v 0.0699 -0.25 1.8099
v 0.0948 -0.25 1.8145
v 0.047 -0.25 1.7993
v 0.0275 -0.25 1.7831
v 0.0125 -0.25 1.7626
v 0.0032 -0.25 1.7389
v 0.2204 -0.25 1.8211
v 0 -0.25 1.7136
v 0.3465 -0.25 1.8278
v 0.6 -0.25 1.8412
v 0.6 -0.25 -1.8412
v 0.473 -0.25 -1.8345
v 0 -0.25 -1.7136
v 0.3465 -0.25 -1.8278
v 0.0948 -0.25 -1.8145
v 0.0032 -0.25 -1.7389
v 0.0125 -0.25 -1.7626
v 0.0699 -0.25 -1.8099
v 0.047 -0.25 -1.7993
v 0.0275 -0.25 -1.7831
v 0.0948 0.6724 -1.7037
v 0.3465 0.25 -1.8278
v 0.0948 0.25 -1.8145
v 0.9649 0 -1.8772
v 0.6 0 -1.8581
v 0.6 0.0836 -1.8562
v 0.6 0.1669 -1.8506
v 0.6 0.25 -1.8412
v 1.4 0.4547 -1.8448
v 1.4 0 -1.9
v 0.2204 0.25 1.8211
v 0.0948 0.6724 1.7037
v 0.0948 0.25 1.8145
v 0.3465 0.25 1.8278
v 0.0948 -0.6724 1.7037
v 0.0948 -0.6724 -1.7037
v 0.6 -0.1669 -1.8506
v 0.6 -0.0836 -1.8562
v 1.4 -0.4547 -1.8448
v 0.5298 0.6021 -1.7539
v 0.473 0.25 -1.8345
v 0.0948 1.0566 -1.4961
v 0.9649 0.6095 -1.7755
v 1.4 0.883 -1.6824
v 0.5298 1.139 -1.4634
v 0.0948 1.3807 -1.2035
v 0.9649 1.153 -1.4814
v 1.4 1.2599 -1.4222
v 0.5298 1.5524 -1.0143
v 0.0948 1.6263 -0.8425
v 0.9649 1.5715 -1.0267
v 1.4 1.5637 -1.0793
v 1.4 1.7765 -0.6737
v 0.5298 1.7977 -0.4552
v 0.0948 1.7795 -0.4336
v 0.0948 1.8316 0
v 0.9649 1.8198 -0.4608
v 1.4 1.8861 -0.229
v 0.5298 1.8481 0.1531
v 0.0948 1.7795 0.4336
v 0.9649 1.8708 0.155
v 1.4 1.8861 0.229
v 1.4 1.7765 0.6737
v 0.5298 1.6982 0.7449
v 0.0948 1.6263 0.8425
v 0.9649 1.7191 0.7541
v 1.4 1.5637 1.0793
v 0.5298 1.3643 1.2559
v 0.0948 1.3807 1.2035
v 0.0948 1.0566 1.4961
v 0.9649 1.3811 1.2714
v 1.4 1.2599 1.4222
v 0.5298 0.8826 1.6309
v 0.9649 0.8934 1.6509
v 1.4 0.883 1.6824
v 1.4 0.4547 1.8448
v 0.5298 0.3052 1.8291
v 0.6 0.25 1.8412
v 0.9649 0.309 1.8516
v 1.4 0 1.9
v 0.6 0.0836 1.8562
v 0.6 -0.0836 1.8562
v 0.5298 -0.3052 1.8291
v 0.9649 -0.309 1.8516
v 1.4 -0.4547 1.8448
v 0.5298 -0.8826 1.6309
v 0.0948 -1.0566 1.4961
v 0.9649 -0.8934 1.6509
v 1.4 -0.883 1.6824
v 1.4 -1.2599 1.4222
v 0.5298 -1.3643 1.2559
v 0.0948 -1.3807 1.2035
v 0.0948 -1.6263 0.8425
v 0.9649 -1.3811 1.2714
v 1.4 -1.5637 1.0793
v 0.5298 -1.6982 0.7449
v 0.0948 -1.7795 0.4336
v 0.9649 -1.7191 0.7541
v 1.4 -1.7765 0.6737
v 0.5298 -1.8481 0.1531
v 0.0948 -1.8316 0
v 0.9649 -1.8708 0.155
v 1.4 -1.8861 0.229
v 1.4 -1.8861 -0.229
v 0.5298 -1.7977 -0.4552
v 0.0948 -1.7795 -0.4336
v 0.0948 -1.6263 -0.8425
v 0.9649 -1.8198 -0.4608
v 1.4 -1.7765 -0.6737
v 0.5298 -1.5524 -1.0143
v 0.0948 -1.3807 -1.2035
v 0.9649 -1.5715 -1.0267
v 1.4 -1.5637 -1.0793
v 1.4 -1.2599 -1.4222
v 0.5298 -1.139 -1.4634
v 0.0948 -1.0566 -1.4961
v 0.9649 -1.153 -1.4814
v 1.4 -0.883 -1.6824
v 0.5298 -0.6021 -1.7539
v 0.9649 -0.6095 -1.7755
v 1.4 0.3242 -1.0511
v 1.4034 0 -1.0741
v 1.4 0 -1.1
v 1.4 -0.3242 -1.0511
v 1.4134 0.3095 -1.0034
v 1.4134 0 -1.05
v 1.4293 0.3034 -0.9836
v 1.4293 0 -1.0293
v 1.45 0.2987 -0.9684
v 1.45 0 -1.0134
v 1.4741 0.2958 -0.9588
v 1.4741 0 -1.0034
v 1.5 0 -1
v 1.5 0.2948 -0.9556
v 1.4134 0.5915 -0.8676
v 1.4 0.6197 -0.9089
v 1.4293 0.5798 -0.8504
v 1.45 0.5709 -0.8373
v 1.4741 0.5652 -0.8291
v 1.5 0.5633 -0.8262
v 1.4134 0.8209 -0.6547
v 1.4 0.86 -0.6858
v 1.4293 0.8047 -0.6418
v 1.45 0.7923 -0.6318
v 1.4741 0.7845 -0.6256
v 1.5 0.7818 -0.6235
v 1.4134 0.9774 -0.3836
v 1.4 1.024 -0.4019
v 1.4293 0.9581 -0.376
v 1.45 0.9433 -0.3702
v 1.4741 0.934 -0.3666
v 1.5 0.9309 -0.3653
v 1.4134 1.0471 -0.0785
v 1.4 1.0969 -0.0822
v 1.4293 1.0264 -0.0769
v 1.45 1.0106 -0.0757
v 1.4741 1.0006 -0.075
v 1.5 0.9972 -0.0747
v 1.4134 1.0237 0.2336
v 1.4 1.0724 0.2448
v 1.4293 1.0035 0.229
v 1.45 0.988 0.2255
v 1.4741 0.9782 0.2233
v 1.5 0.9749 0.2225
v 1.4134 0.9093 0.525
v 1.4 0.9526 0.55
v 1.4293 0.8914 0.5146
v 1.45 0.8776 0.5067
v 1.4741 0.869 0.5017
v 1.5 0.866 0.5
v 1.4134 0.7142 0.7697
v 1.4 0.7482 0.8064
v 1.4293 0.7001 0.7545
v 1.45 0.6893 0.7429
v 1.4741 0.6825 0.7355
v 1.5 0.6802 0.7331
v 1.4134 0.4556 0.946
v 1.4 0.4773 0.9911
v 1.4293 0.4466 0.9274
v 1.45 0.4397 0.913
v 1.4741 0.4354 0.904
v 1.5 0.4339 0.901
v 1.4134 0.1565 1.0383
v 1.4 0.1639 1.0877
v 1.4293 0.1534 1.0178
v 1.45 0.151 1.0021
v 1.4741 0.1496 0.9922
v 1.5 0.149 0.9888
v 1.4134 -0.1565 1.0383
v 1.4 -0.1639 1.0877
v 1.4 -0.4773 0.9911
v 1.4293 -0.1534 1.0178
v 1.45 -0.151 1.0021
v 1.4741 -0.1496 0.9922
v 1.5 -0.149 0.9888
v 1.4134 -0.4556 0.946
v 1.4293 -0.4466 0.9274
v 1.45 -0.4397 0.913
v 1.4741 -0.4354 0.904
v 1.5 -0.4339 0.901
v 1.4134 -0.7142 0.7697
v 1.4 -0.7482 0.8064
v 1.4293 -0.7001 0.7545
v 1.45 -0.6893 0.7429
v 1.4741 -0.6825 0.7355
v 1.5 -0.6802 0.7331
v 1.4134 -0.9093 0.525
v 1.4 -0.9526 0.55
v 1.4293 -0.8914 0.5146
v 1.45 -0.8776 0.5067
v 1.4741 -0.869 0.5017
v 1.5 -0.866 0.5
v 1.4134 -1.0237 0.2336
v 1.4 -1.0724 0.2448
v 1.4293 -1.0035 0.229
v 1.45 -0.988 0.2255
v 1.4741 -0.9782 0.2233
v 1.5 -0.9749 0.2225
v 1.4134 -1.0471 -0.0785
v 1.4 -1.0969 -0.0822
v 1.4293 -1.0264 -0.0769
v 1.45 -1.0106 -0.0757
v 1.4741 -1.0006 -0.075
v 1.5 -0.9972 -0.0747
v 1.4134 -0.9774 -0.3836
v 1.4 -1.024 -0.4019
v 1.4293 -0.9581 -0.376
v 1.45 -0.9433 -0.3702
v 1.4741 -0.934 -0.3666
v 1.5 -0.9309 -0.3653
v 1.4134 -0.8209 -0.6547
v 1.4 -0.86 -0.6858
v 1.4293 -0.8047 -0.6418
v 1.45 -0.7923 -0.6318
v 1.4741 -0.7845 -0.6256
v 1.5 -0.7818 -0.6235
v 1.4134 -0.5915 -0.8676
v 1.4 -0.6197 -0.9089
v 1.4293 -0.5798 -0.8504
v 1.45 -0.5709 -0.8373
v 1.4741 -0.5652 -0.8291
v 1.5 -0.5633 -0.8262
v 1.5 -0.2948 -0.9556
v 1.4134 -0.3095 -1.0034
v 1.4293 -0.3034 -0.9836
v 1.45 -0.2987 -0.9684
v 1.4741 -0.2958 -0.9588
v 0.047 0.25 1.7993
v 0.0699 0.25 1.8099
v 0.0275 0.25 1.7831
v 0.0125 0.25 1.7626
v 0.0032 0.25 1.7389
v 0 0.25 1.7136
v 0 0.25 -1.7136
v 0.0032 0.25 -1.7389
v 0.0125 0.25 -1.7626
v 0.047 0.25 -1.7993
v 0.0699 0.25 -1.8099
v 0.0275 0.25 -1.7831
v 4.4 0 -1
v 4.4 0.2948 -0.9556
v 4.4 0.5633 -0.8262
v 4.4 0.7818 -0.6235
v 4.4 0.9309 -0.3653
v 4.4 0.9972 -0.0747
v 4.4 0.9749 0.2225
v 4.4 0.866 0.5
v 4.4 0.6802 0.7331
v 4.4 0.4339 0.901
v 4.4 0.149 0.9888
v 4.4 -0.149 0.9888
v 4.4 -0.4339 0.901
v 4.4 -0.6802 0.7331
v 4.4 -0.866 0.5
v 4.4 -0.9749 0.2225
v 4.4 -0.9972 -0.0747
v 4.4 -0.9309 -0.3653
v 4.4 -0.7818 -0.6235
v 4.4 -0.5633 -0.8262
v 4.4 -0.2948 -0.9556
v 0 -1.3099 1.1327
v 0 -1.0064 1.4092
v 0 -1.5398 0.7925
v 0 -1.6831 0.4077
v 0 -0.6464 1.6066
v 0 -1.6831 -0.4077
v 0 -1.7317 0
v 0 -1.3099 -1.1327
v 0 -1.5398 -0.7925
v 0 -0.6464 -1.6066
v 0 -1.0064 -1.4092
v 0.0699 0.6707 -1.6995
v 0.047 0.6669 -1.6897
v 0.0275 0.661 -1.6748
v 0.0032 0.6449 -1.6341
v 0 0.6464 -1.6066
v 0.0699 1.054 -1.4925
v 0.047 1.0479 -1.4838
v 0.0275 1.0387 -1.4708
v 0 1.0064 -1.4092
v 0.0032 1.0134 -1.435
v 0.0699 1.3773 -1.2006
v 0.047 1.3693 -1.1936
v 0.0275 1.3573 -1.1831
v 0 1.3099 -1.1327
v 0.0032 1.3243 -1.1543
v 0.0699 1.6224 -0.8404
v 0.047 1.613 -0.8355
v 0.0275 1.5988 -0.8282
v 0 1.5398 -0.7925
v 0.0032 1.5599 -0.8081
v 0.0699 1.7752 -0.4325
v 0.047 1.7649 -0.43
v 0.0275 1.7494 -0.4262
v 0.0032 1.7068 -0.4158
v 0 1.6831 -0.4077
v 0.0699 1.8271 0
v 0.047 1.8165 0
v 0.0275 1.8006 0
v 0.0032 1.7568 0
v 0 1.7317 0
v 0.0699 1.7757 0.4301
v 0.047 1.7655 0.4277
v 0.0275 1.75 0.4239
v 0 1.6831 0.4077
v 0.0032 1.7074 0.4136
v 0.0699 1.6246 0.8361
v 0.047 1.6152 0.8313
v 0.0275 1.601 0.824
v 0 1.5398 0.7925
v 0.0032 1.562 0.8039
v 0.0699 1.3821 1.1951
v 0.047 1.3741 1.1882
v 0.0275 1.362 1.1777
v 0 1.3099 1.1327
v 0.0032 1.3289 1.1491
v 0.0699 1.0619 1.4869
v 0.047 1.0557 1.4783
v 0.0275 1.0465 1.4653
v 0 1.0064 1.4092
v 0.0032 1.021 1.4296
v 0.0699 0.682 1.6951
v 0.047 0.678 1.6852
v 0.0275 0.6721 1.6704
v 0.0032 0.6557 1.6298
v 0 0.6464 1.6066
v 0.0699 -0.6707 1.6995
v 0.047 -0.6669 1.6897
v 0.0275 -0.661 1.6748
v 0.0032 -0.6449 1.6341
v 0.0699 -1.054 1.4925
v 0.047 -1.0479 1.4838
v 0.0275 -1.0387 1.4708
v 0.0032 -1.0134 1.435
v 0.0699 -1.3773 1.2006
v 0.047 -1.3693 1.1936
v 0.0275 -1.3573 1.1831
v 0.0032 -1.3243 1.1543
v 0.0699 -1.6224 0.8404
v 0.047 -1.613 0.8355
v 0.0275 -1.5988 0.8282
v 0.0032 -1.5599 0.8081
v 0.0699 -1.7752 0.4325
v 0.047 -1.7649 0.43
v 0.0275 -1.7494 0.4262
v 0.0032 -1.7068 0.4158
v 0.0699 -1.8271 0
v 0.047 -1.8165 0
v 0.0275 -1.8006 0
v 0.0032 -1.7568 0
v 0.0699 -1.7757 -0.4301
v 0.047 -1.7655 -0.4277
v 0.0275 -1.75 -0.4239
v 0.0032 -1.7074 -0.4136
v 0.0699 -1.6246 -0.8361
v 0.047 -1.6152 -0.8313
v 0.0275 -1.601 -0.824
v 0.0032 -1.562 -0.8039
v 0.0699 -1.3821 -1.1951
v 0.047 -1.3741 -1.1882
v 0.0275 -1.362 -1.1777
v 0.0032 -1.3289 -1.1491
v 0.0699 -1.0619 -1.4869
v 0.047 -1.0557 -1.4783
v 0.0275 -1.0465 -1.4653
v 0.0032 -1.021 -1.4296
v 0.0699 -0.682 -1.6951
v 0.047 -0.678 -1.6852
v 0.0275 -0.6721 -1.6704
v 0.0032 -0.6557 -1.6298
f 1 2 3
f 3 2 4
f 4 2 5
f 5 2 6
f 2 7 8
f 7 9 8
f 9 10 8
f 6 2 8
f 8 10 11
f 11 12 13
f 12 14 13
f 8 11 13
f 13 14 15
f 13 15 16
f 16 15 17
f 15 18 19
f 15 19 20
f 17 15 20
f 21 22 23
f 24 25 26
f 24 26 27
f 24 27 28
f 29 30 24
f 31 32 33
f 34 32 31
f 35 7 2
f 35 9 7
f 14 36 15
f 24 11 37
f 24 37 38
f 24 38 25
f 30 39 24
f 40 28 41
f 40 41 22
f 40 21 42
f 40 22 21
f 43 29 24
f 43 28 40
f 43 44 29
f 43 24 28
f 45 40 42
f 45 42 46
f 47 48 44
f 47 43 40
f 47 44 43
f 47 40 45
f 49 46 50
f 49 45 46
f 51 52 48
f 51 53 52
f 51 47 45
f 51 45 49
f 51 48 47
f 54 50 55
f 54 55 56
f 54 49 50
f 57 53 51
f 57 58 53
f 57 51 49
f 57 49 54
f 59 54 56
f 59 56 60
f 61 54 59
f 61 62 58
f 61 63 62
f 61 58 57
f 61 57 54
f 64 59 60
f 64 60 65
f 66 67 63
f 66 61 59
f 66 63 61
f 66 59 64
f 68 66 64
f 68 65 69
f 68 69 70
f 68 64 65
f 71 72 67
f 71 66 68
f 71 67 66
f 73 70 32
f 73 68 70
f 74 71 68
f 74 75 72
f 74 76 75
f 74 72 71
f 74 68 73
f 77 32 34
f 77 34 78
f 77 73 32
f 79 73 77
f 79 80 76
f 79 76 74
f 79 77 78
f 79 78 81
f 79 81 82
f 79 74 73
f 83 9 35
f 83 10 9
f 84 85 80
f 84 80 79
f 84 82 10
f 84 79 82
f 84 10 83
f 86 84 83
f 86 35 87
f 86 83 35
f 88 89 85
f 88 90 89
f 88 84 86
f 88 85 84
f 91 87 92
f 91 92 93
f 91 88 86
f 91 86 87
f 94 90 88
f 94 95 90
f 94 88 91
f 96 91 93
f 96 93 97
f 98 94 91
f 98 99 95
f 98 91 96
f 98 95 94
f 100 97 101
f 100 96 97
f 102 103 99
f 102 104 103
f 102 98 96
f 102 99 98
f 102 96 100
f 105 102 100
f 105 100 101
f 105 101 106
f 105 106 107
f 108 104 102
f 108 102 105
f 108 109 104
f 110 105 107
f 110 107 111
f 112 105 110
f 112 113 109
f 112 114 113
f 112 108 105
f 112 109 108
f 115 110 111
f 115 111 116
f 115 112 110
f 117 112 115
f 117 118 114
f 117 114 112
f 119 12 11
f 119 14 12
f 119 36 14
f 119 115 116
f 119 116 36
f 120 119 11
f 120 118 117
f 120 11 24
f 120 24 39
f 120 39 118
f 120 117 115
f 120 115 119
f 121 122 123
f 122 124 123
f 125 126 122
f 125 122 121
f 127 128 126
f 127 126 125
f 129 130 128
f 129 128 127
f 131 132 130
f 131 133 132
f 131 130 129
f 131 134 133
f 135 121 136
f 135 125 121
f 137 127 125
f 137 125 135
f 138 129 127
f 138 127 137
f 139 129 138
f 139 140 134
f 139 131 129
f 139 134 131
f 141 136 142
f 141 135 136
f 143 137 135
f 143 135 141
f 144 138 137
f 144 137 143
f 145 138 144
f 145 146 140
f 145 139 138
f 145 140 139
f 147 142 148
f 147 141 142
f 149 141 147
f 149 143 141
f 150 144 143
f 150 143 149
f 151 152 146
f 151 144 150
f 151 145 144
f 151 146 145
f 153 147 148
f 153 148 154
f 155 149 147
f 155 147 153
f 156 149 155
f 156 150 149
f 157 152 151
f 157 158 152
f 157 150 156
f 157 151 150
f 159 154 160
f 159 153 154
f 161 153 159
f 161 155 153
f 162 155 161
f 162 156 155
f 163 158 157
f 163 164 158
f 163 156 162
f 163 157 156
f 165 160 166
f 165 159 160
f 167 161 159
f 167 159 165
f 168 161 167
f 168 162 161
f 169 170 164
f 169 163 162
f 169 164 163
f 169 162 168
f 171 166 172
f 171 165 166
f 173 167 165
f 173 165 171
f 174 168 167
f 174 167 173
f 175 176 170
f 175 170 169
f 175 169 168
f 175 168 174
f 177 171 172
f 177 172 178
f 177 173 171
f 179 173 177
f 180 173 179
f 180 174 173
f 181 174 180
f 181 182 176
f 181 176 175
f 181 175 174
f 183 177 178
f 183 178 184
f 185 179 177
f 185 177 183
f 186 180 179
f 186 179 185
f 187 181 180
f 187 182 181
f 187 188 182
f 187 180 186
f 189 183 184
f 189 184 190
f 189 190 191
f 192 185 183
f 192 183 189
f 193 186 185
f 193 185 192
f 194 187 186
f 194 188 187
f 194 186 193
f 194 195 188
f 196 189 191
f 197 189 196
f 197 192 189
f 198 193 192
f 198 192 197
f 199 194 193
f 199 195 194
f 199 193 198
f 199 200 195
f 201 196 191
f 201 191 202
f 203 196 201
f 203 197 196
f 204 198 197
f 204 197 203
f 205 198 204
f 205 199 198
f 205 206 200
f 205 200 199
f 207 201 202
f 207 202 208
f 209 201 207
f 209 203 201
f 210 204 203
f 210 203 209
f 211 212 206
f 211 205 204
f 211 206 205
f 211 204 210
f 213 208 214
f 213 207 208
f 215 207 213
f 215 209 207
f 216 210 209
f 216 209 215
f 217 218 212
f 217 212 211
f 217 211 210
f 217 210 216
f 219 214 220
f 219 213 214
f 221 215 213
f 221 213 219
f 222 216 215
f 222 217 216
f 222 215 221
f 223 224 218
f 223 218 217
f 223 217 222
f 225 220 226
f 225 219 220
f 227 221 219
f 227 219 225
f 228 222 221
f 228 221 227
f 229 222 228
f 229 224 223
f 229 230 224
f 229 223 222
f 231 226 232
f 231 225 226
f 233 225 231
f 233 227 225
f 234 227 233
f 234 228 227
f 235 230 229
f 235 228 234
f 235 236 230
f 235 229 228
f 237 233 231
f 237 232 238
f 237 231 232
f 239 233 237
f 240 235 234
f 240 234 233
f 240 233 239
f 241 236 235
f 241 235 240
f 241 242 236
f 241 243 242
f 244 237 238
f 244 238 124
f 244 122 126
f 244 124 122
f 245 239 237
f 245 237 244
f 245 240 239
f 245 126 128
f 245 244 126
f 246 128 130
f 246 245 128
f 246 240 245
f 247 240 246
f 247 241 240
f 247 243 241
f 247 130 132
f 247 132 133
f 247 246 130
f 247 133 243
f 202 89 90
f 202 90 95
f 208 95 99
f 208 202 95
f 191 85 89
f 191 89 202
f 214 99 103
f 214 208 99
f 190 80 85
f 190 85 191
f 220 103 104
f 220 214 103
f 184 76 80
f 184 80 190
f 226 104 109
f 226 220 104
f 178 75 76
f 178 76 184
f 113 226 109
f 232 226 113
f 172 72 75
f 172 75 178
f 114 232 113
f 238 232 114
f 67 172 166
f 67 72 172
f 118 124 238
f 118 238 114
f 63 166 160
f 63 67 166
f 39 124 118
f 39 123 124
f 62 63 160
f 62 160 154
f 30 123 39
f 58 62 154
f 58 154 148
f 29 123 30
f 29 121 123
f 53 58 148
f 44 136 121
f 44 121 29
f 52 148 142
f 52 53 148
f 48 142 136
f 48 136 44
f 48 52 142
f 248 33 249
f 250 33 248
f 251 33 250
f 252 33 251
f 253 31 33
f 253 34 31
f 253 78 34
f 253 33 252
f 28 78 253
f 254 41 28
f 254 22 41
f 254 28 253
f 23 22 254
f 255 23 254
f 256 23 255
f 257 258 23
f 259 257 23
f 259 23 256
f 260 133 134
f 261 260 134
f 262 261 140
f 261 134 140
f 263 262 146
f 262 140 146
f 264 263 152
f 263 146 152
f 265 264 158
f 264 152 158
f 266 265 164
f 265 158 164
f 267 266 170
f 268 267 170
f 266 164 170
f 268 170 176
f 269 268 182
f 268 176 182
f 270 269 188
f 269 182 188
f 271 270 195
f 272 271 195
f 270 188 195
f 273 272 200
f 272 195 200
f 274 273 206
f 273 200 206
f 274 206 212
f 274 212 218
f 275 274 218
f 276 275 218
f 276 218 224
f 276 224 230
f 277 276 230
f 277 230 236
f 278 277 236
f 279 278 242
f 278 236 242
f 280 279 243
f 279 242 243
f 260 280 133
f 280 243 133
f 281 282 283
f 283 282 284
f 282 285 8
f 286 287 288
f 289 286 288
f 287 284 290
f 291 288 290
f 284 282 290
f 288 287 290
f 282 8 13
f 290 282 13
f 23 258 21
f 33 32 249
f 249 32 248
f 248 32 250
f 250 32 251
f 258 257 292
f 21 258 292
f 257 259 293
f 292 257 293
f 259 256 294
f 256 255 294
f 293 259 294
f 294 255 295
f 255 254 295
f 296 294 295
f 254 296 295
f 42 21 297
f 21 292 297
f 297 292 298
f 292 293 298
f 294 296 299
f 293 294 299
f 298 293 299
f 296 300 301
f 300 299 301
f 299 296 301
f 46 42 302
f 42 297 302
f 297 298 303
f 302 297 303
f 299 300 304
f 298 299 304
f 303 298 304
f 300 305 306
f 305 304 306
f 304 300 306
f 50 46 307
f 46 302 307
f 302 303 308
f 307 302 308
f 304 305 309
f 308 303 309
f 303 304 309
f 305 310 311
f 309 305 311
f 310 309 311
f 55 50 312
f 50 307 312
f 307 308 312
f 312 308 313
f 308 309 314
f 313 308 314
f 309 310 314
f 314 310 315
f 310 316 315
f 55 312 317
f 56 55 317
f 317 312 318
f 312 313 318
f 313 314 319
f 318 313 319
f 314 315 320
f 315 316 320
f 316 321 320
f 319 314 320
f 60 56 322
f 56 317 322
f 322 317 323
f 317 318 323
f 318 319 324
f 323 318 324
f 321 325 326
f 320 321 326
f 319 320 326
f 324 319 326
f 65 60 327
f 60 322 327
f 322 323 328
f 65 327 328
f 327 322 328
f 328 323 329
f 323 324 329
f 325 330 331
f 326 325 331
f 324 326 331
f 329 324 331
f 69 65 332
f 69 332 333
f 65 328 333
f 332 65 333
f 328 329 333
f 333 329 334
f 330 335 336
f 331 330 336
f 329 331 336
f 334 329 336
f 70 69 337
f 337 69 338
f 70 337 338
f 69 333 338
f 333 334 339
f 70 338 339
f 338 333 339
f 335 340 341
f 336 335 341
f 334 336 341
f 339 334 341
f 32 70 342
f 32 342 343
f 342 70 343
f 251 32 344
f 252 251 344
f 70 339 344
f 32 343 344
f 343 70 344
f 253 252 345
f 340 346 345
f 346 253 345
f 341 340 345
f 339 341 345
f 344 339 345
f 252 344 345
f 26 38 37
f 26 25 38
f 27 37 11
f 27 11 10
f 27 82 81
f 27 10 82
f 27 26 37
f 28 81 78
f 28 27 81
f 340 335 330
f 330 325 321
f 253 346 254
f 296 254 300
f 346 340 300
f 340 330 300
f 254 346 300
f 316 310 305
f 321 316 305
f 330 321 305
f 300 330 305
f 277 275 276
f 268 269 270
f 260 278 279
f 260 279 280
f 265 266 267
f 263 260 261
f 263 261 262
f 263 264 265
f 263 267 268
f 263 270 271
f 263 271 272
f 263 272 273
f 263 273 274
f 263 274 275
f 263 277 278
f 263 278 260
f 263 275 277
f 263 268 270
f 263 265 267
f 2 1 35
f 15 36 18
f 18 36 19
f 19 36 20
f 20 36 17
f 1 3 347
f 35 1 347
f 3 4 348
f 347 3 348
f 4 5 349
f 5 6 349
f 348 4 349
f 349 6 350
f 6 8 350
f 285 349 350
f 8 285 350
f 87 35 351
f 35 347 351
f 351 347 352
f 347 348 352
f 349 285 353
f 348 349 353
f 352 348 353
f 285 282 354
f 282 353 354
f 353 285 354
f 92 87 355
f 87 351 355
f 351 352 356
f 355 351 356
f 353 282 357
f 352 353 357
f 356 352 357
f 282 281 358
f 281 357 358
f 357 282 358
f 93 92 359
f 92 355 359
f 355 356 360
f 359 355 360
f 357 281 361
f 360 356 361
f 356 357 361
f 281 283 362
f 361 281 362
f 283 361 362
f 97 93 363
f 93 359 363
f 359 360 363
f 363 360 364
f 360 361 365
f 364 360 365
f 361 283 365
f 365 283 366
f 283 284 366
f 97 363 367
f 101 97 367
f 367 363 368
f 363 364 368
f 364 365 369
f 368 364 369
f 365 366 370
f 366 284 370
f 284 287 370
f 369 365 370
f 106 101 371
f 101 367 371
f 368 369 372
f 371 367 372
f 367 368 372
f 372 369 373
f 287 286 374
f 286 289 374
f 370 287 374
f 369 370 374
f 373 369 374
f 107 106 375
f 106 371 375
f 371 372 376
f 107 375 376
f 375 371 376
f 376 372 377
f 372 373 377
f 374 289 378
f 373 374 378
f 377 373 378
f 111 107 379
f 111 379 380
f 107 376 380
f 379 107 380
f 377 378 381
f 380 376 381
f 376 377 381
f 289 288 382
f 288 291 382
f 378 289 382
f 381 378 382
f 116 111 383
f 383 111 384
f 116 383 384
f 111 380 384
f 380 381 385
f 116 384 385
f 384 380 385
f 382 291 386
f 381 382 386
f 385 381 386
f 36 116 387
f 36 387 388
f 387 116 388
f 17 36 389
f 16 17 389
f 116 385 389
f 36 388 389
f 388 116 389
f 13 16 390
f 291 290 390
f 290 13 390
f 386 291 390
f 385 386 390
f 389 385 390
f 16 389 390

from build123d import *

# Parameters (mm, degrees)
SKETCH2_R       = 1.9
BASEHEAD_DEPTH  = 1.4
BASEHEAD_DRAFT  = -3
SKETCH3_R       = 1
BASEBODY_DEPTH  = 3
SLOT_DEPTH      = 8.598684097
SLOT_DEPTH_BACK = 8.598684097
SKETCH4_W       = 0.5
SKETCH4_H       = 0.6
HEADFILLET_R    = 0.1


with BuildPart() as part:
    # Sketch2 → BaseHead (with draft: the straight prism first)
    with BuildSketch(Plane(origin=(1.4, 0, 0), x_dir=(0, 0, -1), z_dir=(1, 0, 0))):
        Circle(SKETCH2_R)
    extrude(amount=-BASEHEAD_DEPTH)
    # BaseHead: the draft: its side faces are tilted about the plane it starts from
    basehead_sides = [part.faces().sort_by_distance(p)[0] for p in [
        (0.7, 0, 1.9),
    ]]
    draft(basehead_sides, Plane(origin=(1.4, 0, 0), x_dir=(0, 0, -1), z_dir=(1, 0, 0)), BASEHEAD_DRAFT)

    # Sketch3 → BaseBody (add)
    with BuildSketch(Plane(origin=(1.4, -1.110095321, -1.354392991), x_dir=(0, 0, -1), z_dir=(1, 0, 0))):
        with Locations((-1.354392991, 1.110095321)):
            Circle(SKETCH3_R)
    extrude(amount=BASEBODY_DEPTH)

    # Sketch4 → Slot (cut, two sides: drawn at the far end of the back side and taken through both)
    with BuildSketch(Plane(origin=(-1.9, -1.9, 0), x_dir=(0, 1, 0), z_dir=(0, 0, 1)).offset(-SLOT_DEPTH_BACK)):
        with Locations((1.9, -2.2)):
            Rectangle(SKETCH4_W, SKETCH4_H)
    extrude(amount=SLOT_DEPTH + SLOT_DEPTH_BACK, mode=Mode.SUBTRACT)

    # HeadFillet
    headfillet_edges = [part.edges().sort_by_distance(p)[0] for p in [
        (1.4, 0, 1),
        (0, -1.826629109, 0),
        (0, 1.826629109, 0),
    ]]
    fillet(headfillet_edges, radius=HEADFILLET_R)


solid = part.part
